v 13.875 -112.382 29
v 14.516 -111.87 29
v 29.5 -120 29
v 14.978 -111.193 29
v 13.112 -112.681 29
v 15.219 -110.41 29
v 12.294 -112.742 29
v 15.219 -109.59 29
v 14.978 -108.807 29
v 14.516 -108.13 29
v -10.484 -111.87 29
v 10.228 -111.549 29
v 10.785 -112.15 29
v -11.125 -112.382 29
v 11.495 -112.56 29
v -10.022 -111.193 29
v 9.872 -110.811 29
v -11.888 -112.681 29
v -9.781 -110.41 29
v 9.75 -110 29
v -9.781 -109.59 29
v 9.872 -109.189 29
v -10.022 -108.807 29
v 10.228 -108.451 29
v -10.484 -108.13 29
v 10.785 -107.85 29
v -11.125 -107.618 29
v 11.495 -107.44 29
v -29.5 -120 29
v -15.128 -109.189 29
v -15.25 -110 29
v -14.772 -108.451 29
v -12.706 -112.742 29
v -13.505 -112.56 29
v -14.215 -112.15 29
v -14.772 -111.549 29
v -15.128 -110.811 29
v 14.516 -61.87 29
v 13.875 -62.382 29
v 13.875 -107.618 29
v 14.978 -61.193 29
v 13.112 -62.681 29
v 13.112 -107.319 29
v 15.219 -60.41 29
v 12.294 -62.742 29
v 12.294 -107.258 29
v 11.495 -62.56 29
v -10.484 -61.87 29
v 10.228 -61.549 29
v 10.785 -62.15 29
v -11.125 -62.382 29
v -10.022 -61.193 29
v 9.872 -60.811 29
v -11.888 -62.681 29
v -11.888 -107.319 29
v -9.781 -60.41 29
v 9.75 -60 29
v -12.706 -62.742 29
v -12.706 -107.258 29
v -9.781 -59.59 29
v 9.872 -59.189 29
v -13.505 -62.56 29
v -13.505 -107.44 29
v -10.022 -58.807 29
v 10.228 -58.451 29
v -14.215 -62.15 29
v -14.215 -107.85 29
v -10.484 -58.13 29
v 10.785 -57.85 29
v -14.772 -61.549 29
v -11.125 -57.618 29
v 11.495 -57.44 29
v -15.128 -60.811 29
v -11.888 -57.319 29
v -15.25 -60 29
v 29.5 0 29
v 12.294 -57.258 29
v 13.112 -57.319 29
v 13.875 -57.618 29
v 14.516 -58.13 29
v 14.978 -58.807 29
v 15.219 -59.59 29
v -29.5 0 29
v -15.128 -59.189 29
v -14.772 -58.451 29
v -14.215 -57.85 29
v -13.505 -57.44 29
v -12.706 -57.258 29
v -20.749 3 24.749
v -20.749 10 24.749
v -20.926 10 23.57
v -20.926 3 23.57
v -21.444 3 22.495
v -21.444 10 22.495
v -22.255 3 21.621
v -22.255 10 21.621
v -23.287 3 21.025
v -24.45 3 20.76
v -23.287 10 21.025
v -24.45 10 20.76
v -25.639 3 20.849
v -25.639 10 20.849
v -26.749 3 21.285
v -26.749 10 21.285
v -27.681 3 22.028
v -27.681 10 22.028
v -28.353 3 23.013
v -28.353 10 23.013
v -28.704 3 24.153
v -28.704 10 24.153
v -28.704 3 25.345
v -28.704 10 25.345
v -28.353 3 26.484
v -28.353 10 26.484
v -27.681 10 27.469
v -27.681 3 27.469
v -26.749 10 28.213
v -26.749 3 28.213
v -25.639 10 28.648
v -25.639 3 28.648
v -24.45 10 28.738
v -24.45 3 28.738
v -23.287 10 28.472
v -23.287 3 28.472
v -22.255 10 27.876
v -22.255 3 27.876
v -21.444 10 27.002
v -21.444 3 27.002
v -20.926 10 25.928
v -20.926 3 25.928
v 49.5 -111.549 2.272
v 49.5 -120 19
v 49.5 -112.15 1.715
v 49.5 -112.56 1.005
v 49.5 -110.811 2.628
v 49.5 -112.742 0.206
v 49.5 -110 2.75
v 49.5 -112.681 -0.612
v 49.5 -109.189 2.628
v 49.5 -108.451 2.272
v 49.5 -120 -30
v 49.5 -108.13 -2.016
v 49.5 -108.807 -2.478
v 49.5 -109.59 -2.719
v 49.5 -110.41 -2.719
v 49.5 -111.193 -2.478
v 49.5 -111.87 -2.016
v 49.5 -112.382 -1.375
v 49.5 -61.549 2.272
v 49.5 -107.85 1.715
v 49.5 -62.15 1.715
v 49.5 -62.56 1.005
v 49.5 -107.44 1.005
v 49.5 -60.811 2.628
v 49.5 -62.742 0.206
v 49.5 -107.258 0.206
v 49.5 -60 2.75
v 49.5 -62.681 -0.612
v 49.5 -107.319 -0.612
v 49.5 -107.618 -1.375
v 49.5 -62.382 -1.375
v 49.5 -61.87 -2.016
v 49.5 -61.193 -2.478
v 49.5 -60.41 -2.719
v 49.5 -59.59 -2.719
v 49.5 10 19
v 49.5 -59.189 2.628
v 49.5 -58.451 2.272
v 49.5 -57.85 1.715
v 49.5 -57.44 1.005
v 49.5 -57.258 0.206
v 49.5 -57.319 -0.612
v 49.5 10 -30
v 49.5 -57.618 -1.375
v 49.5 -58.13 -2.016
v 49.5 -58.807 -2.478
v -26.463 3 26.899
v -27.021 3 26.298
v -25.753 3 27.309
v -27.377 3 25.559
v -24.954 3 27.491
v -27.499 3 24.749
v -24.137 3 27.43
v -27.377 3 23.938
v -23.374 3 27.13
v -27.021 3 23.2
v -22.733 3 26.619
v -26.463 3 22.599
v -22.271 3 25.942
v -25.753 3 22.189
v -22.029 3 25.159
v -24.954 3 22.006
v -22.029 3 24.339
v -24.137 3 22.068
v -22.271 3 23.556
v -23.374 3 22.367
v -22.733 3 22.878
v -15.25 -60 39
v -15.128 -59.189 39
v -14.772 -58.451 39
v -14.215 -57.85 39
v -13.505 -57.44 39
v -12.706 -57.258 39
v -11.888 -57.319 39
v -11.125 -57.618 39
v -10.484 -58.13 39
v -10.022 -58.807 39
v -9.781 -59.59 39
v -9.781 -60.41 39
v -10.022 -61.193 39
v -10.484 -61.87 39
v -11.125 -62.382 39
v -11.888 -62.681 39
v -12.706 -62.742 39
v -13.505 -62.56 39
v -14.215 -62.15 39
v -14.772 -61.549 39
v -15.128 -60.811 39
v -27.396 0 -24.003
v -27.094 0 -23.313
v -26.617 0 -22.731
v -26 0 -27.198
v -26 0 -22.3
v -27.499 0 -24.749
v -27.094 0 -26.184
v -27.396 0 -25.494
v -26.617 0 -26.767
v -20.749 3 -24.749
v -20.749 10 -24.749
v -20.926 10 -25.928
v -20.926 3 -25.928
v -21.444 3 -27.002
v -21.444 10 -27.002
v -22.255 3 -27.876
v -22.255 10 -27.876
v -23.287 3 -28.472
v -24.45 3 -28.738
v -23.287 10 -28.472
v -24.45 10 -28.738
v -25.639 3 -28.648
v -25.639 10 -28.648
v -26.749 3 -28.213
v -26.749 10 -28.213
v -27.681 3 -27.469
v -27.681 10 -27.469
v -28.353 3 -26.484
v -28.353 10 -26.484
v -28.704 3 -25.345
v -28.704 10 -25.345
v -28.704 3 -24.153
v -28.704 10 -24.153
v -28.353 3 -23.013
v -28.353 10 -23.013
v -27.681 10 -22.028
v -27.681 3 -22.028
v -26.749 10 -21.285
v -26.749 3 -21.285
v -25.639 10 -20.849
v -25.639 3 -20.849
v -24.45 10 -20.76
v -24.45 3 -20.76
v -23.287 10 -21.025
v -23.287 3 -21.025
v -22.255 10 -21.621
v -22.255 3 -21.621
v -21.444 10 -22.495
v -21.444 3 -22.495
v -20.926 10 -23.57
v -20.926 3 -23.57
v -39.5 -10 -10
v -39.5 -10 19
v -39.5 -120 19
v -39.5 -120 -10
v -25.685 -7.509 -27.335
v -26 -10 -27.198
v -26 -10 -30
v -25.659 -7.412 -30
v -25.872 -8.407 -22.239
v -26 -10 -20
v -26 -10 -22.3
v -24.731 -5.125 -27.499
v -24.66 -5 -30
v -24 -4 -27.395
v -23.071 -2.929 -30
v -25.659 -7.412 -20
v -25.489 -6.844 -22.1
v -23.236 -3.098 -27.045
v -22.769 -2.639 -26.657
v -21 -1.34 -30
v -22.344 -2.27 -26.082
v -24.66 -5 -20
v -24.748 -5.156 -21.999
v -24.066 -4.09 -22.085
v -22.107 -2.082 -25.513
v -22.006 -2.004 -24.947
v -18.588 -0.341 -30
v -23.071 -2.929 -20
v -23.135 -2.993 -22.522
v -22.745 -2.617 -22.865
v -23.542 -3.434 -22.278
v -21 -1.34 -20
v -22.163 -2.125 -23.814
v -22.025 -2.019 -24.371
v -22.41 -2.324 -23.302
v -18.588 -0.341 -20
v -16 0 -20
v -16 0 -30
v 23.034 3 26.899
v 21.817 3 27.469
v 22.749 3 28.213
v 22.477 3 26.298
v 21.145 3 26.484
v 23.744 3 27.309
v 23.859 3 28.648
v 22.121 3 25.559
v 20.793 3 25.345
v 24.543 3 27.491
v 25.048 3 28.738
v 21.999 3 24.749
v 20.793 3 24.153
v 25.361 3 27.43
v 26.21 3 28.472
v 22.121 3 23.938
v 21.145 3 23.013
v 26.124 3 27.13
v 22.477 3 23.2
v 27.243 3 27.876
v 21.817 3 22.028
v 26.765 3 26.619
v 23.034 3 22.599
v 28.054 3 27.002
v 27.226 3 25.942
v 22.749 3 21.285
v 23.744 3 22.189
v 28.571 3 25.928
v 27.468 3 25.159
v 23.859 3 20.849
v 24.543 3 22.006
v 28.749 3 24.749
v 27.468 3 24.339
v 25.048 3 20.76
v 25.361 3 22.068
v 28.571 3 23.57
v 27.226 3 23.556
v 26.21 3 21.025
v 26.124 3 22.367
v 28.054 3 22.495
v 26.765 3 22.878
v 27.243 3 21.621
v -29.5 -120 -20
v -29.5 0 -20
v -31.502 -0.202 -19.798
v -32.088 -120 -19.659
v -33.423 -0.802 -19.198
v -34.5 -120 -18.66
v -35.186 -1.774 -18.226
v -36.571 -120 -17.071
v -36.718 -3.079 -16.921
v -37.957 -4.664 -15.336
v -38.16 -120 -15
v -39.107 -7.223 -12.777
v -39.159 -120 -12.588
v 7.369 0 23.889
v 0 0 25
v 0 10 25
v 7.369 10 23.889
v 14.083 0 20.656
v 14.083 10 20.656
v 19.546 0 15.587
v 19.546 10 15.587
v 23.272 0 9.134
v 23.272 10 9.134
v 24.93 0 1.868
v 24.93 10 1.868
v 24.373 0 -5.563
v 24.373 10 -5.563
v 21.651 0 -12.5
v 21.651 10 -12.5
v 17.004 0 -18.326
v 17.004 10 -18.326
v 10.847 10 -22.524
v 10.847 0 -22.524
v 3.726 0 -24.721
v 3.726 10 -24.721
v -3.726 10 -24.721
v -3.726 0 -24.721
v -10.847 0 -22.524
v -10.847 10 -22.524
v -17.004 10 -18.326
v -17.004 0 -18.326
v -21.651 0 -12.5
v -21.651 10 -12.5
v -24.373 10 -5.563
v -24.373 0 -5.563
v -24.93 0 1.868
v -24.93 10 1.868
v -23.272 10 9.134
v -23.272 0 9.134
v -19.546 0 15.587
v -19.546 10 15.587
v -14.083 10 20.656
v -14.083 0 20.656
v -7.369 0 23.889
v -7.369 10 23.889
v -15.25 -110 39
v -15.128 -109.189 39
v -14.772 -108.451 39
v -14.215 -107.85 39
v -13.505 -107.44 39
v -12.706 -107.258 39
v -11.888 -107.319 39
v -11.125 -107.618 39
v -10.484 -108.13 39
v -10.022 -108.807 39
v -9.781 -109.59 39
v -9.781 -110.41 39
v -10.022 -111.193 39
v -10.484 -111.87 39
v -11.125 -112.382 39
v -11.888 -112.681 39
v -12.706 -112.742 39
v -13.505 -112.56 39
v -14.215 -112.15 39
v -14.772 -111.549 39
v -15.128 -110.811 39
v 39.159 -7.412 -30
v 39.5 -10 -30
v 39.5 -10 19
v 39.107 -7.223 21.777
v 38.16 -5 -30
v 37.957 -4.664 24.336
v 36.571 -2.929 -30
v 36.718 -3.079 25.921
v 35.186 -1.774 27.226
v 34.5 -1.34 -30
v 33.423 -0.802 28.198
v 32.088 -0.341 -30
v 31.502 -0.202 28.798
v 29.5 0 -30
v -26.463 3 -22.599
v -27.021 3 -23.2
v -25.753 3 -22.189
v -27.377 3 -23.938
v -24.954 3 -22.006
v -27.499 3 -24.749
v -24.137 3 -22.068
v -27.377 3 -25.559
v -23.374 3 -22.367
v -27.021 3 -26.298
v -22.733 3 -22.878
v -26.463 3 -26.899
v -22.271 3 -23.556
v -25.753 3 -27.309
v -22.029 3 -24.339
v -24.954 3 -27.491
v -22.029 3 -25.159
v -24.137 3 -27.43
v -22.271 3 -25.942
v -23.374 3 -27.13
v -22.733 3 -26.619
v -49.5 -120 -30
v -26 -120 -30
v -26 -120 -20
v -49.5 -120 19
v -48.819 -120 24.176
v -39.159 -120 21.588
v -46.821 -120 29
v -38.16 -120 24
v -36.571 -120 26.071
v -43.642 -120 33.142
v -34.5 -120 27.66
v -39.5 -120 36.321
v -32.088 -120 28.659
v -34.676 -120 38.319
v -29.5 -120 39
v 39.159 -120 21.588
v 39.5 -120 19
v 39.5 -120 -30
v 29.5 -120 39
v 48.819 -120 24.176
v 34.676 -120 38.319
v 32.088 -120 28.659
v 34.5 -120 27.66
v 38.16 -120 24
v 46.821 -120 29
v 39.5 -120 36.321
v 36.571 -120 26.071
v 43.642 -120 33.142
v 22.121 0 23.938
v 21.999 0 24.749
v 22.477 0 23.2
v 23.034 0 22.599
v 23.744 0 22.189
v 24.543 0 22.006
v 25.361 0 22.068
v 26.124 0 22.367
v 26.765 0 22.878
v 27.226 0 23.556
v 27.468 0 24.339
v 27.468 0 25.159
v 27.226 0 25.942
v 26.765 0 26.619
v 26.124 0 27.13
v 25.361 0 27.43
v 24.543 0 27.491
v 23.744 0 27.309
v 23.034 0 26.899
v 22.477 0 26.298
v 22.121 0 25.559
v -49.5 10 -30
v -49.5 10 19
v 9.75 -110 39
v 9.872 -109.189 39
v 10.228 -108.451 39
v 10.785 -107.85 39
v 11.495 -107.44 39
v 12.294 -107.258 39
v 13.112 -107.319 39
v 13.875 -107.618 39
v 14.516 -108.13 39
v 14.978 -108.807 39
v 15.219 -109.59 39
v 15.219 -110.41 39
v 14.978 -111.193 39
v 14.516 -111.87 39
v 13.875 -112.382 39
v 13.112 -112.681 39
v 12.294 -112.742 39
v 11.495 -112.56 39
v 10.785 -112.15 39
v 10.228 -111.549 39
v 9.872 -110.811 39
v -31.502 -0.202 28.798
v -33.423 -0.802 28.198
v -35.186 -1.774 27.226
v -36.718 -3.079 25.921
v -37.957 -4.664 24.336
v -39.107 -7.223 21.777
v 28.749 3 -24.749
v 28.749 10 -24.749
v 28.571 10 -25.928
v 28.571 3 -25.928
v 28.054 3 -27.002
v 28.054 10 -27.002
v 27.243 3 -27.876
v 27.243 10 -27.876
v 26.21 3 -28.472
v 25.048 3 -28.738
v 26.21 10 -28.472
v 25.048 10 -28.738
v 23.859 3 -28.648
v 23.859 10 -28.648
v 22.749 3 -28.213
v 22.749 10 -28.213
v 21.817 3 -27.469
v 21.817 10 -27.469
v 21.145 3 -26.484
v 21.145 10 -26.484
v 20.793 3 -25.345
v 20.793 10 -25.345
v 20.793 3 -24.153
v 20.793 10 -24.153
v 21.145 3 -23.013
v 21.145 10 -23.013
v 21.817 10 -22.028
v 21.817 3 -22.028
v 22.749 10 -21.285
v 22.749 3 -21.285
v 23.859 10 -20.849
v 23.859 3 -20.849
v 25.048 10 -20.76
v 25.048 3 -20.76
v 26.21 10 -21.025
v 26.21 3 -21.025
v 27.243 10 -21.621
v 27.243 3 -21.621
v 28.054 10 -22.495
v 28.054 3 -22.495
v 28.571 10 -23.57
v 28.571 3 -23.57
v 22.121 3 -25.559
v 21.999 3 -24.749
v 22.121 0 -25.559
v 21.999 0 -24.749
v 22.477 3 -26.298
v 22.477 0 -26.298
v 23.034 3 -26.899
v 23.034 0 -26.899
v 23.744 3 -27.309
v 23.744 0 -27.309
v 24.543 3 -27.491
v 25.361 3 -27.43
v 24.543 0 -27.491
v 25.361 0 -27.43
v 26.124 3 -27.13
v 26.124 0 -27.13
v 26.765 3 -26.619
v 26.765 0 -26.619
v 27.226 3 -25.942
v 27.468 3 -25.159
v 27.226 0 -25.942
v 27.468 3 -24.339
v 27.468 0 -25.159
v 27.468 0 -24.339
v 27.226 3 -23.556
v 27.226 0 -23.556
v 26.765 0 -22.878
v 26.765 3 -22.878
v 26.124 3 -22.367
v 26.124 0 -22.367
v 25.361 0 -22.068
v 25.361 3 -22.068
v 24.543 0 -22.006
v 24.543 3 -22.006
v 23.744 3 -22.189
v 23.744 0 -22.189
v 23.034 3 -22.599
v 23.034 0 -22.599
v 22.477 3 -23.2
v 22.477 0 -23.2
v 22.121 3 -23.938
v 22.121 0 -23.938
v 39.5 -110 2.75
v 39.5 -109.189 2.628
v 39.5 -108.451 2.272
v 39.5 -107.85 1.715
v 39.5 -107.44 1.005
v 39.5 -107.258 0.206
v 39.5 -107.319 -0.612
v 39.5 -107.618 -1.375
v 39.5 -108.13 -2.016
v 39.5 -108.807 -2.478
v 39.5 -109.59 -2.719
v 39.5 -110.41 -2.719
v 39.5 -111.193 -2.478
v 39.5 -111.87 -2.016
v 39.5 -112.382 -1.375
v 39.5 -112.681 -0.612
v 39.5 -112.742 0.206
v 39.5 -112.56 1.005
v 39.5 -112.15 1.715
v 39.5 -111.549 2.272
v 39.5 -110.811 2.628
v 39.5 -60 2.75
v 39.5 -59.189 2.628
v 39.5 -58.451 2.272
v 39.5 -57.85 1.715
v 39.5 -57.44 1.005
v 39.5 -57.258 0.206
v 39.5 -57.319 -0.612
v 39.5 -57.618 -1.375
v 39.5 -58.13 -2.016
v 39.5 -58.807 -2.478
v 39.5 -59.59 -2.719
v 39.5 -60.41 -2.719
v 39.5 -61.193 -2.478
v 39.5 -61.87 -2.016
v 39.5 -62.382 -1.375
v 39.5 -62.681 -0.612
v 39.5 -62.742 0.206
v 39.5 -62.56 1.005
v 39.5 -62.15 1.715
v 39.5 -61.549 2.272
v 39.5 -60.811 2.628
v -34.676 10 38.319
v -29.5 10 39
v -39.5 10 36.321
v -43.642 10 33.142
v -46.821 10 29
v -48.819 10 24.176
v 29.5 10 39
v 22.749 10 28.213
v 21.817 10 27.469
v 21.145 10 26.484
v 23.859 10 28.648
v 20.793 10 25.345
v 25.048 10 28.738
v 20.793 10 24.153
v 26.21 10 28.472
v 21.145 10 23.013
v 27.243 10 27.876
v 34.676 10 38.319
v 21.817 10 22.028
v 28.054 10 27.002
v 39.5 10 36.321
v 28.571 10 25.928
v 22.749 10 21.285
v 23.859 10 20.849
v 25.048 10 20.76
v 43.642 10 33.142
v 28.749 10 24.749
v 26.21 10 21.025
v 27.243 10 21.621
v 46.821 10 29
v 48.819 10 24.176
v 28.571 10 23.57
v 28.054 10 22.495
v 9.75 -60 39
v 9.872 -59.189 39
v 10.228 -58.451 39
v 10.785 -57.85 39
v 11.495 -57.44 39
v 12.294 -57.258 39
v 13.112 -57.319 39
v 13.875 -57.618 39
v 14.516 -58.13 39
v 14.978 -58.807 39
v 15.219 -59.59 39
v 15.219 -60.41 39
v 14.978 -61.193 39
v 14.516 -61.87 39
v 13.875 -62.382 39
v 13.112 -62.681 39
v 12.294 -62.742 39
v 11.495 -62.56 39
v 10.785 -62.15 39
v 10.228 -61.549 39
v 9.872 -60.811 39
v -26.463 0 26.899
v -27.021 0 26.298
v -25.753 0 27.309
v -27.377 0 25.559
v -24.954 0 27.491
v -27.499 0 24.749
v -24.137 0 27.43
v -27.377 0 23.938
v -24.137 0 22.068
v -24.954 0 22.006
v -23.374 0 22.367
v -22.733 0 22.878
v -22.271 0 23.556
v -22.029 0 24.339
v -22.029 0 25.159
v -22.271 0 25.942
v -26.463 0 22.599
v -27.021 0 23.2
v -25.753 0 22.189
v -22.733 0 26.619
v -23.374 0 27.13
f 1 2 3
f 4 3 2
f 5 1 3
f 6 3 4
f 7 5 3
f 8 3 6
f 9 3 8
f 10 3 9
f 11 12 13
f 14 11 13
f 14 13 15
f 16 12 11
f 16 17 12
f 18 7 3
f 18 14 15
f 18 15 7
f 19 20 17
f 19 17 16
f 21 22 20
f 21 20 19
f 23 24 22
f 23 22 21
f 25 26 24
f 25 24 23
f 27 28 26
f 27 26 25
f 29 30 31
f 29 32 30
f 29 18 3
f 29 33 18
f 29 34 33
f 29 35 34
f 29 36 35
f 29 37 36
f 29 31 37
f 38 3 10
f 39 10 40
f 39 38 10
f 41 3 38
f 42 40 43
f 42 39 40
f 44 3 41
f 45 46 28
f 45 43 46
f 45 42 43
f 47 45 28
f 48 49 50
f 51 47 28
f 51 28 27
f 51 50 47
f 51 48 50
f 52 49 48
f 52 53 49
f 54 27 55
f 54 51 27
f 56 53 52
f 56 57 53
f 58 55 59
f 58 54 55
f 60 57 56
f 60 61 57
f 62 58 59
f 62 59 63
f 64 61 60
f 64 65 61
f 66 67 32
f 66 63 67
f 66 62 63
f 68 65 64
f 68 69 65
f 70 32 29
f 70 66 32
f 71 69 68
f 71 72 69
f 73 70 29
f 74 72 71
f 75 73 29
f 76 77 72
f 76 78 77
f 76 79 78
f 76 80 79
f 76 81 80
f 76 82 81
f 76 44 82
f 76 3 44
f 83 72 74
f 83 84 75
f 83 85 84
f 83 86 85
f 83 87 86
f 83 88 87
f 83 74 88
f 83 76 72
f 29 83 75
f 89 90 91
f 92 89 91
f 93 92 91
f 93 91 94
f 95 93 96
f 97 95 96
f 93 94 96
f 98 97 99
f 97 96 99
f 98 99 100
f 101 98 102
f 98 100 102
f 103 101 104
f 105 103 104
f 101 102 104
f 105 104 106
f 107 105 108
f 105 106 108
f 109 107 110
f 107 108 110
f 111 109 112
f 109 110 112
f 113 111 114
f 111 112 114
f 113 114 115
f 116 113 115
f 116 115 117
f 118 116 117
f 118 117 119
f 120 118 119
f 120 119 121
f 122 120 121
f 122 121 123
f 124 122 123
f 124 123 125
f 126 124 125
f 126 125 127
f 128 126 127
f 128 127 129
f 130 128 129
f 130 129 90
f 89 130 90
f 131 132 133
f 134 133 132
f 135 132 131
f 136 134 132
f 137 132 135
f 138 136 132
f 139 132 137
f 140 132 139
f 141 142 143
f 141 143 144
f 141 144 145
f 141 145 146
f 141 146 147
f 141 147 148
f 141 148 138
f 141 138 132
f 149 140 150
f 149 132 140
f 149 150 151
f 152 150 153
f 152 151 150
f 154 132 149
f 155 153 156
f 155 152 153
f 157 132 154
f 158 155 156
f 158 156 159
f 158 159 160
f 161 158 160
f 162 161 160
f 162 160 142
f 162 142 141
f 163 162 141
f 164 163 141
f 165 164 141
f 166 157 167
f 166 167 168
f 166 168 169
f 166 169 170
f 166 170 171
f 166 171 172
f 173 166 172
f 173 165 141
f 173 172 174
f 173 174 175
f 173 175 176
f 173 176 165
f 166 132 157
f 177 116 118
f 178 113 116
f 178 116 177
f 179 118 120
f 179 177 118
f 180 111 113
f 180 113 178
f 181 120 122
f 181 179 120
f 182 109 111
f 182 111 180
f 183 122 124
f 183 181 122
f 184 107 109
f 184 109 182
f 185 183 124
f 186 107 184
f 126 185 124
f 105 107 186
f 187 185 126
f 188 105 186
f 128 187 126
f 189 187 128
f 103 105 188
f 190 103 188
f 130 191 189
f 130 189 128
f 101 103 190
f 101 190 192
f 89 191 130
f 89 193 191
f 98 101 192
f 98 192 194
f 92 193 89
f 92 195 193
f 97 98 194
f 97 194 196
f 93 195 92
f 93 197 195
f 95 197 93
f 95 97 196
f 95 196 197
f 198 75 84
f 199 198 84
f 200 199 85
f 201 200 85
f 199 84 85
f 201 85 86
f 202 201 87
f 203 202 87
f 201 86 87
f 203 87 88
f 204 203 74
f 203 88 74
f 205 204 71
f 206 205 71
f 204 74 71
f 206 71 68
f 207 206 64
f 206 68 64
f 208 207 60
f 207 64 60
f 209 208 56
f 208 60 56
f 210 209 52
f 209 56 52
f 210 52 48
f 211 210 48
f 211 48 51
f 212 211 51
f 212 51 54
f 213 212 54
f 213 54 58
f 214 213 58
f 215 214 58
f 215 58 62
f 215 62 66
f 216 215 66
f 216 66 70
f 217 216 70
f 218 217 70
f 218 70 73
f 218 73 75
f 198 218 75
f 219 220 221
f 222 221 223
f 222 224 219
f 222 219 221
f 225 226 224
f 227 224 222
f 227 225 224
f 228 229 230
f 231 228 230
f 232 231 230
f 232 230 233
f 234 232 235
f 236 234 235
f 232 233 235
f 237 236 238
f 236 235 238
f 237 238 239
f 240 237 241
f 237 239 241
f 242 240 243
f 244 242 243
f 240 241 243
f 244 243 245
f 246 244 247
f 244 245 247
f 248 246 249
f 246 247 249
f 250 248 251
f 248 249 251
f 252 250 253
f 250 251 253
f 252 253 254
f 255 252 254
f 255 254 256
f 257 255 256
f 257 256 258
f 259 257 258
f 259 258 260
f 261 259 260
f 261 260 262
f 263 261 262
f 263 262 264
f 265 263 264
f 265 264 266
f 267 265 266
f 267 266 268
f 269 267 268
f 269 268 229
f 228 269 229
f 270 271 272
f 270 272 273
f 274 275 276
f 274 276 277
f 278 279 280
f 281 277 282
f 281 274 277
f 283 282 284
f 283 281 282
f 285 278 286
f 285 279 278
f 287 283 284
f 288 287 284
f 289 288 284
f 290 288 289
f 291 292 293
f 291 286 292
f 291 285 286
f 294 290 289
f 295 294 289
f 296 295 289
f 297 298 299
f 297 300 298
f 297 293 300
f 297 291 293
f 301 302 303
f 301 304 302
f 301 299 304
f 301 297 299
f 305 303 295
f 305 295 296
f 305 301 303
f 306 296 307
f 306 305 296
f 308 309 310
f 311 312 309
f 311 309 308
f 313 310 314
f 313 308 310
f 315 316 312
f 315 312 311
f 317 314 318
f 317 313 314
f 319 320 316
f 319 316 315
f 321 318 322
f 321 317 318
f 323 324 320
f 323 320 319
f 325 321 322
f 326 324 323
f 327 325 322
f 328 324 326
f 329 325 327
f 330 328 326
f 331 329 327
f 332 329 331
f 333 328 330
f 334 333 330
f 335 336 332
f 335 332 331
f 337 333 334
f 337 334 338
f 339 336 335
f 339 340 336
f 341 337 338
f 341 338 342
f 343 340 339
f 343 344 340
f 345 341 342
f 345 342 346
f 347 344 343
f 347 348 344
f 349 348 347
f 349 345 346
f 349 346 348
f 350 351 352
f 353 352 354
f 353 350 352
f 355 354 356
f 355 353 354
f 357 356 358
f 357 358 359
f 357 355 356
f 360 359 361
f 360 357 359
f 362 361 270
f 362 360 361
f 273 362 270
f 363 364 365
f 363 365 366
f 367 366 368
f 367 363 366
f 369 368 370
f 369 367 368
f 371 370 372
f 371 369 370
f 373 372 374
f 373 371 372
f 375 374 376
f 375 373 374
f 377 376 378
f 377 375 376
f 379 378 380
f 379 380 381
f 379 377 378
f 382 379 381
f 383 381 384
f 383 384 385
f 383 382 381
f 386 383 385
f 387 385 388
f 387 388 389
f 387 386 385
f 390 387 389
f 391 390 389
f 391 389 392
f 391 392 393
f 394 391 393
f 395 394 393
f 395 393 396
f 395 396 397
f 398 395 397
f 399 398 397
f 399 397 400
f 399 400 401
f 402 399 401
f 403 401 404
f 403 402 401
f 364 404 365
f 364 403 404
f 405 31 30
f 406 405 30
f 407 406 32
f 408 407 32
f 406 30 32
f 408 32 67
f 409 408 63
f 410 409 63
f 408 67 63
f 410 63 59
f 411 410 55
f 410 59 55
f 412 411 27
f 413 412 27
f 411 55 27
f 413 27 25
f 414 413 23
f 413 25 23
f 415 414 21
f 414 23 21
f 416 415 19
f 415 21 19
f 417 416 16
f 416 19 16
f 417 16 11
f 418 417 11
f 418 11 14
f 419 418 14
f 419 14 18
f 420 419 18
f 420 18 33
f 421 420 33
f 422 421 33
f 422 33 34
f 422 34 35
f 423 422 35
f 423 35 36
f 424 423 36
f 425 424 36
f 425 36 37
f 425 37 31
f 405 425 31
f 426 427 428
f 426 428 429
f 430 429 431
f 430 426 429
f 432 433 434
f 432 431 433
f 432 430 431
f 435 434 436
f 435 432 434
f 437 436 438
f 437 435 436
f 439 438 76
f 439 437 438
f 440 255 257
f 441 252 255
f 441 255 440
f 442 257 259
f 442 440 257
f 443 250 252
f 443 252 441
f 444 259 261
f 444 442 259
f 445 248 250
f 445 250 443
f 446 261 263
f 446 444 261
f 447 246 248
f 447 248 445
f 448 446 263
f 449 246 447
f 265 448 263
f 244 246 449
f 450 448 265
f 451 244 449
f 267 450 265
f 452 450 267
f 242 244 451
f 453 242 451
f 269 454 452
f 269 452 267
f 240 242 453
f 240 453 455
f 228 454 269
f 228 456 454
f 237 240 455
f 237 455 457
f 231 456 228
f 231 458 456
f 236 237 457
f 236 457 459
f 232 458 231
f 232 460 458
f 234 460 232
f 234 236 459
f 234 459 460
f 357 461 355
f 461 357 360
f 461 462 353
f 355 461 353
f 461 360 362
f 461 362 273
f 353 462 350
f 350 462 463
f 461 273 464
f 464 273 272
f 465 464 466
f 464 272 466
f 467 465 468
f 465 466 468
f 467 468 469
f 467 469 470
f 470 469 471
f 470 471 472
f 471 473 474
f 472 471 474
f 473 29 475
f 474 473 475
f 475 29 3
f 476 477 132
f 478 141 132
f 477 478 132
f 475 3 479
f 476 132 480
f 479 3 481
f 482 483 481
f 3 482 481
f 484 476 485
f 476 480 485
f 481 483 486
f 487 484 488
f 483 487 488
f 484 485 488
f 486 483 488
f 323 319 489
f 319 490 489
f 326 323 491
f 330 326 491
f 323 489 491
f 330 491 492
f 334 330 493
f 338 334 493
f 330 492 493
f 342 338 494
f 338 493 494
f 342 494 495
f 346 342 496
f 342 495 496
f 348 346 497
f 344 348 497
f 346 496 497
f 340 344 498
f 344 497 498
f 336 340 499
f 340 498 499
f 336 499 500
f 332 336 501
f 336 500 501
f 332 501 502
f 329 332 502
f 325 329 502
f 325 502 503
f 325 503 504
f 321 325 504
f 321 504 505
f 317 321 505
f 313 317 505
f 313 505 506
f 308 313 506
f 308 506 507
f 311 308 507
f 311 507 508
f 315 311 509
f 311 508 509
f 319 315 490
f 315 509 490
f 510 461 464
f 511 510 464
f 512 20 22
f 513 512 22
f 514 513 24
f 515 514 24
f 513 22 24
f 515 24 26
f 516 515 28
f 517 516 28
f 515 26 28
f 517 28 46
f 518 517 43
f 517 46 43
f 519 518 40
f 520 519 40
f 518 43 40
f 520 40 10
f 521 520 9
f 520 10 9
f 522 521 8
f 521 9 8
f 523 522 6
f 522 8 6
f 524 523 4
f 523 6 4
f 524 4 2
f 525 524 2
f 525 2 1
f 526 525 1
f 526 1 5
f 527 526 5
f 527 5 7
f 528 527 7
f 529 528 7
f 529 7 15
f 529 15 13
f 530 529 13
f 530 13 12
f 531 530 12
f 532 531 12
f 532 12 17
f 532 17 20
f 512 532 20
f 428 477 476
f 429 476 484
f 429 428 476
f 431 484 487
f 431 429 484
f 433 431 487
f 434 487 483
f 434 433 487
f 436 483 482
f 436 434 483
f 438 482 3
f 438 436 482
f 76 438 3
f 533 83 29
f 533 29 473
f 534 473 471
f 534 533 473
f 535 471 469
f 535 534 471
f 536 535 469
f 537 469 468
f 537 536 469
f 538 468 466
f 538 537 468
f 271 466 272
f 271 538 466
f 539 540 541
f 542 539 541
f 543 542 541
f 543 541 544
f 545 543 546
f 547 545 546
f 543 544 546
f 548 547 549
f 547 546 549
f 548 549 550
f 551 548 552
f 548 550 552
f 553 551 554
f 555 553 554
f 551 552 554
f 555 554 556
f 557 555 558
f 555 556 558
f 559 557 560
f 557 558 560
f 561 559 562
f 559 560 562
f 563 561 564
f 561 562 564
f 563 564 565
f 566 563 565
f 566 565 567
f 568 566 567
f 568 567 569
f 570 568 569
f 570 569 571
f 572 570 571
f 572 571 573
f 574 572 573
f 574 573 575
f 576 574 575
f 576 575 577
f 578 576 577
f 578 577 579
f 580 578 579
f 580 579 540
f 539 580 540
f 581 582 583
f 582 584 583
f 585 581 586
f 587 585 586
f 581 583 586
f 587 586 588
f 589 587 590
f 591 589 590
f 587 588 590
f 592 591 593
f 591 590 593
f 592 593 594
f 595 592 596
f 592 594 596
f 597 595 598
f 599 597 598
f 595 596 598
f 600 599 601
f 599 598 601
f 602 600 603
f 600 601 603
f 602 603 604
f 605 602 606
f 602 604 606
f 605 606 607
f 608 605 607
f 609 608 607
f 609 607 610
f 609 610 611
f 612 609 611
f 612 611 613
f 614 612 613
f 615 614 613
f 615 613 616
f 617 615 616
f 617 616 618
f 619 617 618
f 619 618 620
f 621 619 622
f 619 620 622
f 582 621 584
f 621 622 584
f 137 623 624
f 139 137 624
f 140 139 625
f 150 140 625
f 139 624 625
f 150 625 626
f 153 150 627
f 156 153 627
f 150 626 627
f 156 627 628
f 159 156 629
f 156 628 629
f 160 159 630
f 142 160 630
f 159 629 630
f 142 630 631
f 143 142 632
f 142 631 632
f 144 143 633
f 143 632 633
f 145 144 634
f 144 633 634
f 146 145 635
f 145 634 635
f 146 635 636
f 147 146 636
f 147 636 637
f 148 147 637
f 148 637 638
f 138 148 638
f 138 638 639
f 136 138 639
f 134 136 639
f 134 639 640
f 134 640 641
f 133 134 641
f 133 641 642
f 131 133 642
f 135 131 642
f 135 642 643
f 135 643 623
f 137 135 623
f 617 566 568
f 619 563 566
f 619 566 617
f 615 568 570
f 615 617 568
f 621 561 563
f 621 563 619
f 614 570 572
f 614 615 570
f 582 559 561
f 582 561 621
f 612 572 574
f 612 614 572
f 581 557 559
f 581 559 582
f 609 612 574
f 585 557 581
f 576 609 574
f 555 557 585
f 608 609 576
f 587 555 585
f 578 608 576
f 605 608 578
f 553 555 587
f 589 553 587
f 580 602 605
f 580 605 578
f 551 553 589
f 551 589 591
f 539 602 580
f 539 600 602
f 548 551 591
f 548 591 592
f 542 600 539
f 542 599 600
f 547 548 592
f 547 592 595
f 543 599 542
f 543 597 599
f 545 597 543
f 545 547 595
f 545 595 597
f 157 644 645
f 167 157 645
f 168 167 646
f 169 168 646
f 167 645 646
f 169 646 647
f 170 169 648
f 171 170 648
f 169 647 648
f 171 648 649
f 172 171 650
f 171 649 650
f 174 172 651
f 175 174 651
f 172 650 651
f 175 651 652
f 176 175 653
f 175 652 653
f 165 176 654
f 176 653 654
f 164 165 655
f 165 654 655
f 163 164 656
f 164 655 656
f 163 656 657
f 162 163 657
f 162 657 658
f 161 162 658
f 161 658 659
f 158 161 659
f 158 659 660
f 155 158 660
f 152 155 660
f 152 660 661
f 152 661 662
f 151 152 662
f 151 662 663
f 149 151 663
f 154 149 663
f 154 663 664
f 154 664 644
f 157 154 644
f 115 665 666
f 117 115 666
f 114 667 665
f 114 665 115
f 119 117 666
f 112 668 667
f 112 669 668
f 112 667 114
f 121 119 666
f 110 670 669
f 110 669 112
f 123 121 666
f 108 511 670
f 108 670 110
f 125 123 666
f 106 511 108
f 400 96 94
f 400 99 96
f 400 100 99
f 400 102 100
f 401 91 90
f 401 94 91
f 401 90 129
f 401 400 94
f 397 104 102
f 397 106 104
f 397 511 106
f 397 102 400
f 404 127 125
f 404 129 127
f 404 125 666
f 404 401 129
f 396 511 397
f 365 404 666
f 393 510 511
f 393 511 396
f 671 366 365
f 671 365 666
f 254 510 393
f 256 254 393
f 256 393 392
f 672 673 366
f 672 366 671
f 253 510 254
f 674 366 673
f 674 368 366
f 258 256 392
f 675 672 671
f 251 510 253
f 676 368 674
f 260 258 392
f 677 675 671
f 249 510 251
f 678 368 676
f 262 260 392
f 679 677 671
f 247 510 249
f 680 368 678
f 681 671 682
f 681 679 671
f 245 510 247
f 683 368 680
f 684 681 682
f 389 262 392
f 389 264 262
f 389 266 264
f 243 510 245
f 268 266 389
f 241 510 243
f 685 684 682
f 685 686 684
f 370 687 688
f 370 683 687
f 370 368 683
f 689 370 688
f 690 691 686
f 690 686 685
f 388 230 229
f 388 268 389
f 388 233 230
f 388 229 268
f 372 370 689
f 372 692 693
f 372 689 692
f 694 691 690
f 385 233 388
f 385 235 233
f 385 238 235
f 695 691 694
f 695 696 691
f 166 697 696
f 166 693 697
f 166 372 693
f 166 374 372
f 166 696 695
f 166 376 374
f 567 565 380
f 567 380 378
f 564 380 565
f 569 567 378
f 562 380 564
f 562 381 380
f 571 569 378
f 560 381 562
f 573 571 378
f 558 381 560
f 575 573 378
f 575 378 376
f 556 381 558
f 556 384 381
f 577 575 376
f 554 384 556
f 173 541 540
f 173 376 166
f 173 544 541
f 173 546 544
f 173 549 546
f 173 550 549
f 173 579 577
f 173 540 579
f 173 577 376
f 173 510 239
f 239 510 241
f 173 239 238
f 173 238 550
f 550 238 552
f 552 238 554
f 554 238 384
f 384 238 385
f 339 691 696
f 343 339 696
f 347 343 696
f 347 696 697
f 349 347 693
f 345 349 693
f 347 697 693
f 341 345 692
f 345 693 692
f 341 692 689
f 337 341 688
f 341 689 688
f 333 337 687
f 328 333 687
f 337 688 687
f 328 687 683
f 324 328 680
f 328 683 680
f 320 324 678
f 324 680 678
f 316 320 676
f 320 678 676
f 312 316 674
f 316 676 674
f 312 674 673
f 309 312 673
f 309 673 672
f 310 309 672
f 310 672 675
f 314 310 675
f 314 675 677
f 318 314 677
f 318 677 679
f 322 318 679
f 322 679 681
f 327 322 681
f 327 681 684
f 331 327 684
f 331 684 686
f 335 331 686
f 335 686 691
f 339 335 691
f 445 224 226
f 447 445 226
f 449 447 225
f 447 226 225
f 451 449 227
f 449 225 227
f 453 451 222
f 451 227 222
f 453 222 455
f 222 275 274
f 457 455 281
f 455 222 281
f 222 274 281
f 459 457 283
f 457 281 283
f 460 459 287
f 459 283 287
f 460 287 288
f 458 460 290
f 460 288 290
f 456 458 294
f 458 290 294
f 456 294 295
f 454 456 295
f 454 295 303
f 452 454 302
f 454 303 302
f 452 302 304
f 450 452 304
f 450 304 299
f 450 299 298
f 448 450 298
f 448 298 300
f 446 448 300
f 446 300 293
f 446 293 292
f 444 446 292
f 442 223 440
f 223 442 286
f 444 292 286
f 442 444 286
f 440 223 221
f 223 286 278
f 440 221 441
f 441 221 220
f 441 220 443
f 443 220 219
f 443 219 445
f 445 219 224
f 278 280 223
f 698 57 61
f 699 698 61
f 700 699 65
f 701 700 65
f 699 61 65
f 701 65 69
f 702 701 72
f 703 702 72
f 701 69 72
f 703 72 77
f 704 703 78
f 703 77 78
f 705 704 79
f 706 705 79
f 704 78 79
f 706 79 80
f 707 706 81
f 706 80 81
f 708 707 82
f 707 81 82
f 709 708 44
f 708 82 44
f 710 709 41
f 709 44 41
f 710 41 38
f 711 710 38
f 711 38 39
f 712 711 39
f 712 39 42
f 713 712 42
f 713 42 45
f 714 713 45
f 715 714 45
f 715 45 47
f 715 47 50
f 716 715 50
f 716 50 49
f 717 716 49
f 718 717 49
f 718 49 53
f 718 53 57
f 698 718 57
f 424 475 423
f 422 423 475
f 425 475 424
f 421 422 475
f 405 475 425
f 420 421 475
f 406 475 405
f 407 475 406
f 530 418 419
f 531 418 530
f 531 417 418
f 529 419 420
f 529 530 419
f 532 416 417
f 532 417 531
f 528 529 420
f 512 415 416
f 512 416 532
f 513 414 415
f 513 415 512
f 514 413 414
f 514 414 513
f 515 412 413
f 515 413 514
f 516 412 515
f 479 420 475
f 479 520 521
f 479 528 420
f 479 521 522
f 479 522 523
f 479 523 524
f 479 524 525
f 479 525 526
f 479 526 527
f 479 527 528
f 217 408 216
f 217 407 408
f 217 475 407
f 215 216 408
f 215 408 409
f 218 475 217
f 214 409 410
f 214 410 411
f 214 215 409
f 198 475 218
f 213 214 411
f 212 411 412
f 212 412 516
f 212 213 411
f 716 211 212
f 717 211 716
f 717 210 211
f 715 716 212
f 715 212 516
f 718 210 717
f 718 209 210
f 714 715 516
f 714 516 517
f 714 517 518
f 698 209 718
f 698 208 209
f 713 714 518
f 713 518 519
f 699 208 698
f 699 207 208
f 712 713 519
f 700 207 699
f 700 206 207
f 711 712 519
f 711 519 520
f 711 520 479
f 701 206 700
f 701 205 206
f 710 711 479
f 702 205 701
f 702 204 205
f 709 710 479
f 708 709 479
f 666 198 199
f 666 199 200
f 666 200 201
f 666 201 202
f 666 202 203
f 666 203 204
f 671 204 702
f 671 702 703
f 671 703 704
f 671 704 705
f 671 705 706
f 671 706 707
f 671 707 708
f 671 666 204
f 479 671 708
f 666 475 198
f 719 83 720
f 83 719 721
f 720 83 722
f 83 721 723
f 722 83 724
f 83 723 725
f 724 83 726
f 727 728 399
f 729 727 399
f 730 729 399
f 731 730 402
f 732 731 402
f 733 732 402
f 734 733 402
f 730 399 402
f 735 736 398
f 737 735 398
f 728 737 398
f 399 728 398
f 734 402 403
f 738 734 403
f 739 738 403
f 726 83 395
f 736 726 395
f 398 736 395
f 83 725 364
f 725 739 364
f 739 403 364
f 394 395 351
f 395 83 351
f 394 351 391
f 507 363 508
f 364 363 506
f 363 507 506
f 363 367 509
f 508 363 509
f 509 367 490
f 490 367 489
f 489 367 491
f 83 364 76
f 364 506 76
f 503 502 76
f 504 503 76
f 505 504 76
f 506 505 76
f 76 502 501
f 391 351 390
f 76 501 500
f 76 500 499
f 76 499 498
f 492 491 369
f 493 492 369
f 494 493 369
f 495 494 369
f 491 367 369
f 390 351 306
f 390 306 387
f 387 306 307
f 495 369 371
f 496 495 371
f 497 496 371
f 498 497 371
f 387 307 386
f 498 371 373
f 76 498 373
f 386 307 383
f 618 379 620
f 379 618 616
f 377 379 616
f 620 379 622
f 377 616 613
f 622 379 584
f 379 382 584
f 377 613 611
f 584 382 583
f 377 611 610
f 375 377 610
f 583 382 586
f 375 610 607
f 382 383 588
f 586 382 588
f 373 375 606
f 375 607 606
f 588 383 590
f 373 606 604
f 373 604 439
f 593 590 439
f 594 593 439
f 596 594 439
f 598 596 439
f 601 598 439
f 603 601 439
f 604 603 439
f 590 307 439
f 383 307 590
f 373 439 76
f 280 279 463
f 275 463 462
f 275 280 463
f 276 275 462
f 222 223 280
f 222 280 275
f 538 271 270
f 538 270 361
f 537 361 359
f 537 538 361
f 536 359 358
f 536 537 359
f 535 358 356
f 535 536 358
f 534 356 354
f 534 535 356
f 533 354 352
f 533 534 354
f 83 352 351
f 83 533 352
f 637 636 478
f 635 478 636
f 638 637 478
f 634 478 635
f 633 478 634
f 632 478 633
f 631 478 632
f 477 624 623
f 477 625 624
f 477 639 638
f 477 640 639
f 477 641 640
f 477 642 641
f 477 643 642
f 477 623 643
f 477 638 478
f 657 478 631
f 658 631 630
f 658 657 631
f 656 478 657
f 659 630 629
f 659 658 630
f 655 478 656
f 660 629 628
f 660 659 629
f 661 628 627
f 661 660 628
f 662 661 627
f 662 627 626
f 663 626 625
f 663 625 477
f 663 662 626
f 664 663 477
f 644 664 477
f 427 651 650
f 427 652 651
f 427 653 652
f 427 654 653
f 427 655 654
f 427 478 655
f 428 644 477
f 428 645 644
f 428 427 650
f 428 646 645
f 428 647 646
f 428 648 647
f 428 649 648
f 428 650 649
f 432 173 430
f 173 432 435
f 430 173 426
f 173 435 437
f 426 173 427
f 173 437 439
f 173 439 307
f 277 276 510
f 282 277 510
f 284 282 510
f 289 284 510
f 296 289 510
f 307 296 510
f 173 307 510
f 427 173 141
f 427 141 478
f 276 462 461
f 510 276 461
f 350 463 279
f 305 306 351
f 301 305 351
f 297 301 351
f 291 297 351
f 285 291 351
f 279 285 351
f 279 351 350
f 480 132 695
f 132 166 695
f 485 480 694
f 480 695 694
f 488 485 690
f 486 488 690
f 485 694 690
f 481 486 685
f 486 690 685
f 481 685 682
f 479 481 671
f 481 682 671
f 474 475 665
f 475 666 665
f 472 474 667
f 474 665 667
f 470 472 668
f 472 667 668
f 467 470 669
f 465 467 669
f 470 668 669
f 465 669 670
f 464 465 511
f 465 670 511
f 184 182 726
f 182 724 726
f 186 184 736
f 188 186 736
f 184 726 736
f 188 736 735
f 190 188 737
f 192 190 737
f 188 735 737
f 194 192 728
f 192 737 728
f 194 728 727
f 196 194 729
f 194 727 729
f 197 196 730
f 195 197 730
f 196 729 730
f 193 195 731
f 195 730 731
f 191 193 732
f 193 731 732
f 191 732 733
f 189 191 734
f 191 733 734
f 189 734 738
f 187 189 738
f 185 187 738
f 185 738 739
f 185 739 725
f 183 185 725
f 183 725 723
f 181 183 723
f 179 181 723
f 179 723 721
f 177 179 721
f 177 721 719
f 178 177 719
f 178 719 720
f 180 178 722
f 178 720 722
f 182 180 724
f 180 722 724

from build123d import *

# Parameters (mm, degrees)
SKETCH2_W                      = 99
SKETCH2_H                      = 69
SKETCH2_R                      = 25
BOSS_EXTRUDE1_DEPTH            = 10
BOSS_EXTRUDE2_DEPTH            = 120
CBORE_FOR_M5_SHCS1_D           = 5.5
CBORE_FOR_M5_SHCS1_CBORE_D     = 8
CBORE_FOR_M5_SHCS1_CBORE_DEPTH = 7
M5_CLEARANCE_HOLE1_D           = 5.5
M5_CLEARANCE_HOLE2_D           = 5.5
M5_CLEARANCE_HOLE2_DEPTH       = 10
SKETCH11_W                     = 10
SKETCH11_H                     = 120
BOSS_EXTRUDE3_DEPTH            = 13.5
FILLET1_R                      = 20
FILLET2_R                      = 10


with BuildPart() as part:
    # Sketch2 → Boss-Extrude1 (new body)
    with BuildSketch(Plane(origin=(0, 0, 0), x_dir=(1, 0, 0), z_dir=(0, 1, 0))):
        with Locations((0, -4.5)):
            Rectangle(SKETCH2_W, SKETCH2_H)
        with Locations(Location((0, 0, 0), (0, 0, 270))):
            Circle(SKETCH2_R, mode=Mode.SUBTRACT)
    extrude(amount=BOSS_EXTRUDE1_DEPTH)

    # Sketch3 → Boss-Extrude2 (add)
    with BuildSketch(Plane.XZ):
        Polygon((-49.5, -30), (-49.5, 39), (49.5, 39), (49.5, -30), (39.5, -30), (39.5, 29), (-39.5, 29), (-39.5, -30), align=None)
    extrude(amount=BOSS_EXTRUDE2_DEPTH)

    # CBORE for M5 SHCS1 (through all)
    with Locations(Plane(origin=(0, 10, 0), x_dir=(1, 0, 0), z_dir=(0, 1, 0))):
        with Locations((24.748737342, 24.748737342), (-24.748737342, 24.748737342), (24.748737342, -24.748737342), (-24.748737342, -24.748737342)):
            CounterBoreHole(CBORE_FOR_M5_SHCS1_D / 2, CBORE_FOR_M5_SHCS1_CBORE_D / 2, CBORE_FOR_M5_SHCS1_CBORE_DEPTH)

    # M5 Clearance Hole1 (through all)
    with Locations(Plane.XY.offset(39)):
        with Locations((-12.5, -60), (12.5, -110), (-12.5, -110), (12.5, -60)):
            Hole(M5_CLEARANCE_HOLE1_D / 2)

    # M5 Clearance Hole2
    with Locations(Plane(origin=(49.5, 0, 0), x_dir=(0, 0, -1), z_dir=(1, 0, 0))):
        with Locations((0, -60), (0, -110)):
            Hole(M5_CLEARANCE_HOLE2_D / 2, depth=M5_CLEARANCE_HOLE2_DEPTH)

    # Sketch11 → Boss-Extrude3 (add)
    with BuildSketch(Plane(origin=(-39.5, 0, 0), x_dir=(0, 0, -1), z_dir=(1, 0, 0))):
        with Locations((25, -60)):
            Rectangle(SKETCH11_W, SKETCH11_H)
    extrude(amount=BOSS_EXTRUDE3_DEPTH)

    # Fillet1
    fillet1_edges = [part.edges().sort_by_distance(p)[0] for p in [
        (49.5, -55, 39),
        (-49.5, -55, 39),
    ]]
    fillet(fillet1_edges, radius=FILLET1_R)

    # Fillet2
    # the kernel refuses this fillet: 10 mm, written as the material it adds along each edge
    with BuildSketch(Plane(origin=(39.5, 0, -30), x_dir=(0, -1, 0), z_dir=(0, 0, 1))) as fillet2_piece_1:
        with BuildLine():
            CenterArc((FILLET2_R, -FILLET2_R), FILLET2_R, 90, 90)
            Line((0, -FILLET2_R), (0, 0))
            Line((0, 0), (FILLET2_R, 0))
        make_face()
    extrude(amount=59)
    with BuildSketch(Plane(origin=(-39.5, 0, 29), x_dir=(1, 0, 0), z_dir=(0, 0, -1))) as fillet2_piece_2:
        with BuildLine():
            CenterArc((FILLET2_R, FILLET2_R), FILLET2_R, 180, 90)
            Line((0, FILLET2_R), (0, 0))
            Line((0, 0), (FILLET2_R, 0))
        make_face()
    extrude(amount=49)
    with BuildSketch(Plane(origin=(-39.5, 0, 29), x_dir=(0, 0, -1), z_dir=(0, -1, 0))) as fillet2_piece_3:
        with BuildLine():
            CenterArc((FILLET2_R, FILLET2_R), FILLET2_R, 180, 90)
            Line((0, FILLET2_R), (0, 0))
            Line((0, 0), (FILLET2_R, 0))
        make_face()
    extrude(amount=120)
    with BuildSketch(Plane(origin=(39.5, 0, 29), x_dir=(0, 0, -1), z_dir=(0, -1, 0)), Plane(origin=(-39.5, -120, -20), x_dir=(1, 0, 0), z_dir=(0, 1, 0))) as fillet2_piece_4:
        with BuildLine():
            CenterArc((FILLET2_R, -FILLET2_R), FILLET2_R, 90, 90)
            Line((0, -FILLET2_R), (0, 0))
            Line((0, 0), (FILLET2_R, 0))
        make_face()
    extrude(amount=120)
    with BuildSketch(Plane(origin=(-26, 0, -2.197582327), x_dir=(1, 0, 0), z_dir=(0, 0, -1))) as fillet2_piece_5_section:
        with BuildLine():
            CenterArc((FILLET2_R, FILLET2_R), FILLET2_R, 180, 90)
            Line((0, FILLET2_R), (0, 0))
            Line((0, 0), (FILLET2_R, 0))
        make_face()
    fillet2_piece_5 = extrude(amount=27.802417673, mode=Mode.PRIVATE)
    fillet2_piece_5 = split(fillet2_piece_5, bisect_by=Plane(origin=(-18.601224516, -0.292097945, -20), z_dir=(0, 0, -1)), keep=Keep.TOP, mode=Mode.PRIVATE)
    fillet2_piece_5 = fillet2_piece_5 - Plane(origin=(-24.748737342, -0.292097945, -24.748737342), x_dir=(-1, 0, 0), z_dir=(0, -1, 0)) * Cylinder(2.75, 96, mode=Mode.PRIVATE)
    add(fillet2_piece_5)


solid = part.part
